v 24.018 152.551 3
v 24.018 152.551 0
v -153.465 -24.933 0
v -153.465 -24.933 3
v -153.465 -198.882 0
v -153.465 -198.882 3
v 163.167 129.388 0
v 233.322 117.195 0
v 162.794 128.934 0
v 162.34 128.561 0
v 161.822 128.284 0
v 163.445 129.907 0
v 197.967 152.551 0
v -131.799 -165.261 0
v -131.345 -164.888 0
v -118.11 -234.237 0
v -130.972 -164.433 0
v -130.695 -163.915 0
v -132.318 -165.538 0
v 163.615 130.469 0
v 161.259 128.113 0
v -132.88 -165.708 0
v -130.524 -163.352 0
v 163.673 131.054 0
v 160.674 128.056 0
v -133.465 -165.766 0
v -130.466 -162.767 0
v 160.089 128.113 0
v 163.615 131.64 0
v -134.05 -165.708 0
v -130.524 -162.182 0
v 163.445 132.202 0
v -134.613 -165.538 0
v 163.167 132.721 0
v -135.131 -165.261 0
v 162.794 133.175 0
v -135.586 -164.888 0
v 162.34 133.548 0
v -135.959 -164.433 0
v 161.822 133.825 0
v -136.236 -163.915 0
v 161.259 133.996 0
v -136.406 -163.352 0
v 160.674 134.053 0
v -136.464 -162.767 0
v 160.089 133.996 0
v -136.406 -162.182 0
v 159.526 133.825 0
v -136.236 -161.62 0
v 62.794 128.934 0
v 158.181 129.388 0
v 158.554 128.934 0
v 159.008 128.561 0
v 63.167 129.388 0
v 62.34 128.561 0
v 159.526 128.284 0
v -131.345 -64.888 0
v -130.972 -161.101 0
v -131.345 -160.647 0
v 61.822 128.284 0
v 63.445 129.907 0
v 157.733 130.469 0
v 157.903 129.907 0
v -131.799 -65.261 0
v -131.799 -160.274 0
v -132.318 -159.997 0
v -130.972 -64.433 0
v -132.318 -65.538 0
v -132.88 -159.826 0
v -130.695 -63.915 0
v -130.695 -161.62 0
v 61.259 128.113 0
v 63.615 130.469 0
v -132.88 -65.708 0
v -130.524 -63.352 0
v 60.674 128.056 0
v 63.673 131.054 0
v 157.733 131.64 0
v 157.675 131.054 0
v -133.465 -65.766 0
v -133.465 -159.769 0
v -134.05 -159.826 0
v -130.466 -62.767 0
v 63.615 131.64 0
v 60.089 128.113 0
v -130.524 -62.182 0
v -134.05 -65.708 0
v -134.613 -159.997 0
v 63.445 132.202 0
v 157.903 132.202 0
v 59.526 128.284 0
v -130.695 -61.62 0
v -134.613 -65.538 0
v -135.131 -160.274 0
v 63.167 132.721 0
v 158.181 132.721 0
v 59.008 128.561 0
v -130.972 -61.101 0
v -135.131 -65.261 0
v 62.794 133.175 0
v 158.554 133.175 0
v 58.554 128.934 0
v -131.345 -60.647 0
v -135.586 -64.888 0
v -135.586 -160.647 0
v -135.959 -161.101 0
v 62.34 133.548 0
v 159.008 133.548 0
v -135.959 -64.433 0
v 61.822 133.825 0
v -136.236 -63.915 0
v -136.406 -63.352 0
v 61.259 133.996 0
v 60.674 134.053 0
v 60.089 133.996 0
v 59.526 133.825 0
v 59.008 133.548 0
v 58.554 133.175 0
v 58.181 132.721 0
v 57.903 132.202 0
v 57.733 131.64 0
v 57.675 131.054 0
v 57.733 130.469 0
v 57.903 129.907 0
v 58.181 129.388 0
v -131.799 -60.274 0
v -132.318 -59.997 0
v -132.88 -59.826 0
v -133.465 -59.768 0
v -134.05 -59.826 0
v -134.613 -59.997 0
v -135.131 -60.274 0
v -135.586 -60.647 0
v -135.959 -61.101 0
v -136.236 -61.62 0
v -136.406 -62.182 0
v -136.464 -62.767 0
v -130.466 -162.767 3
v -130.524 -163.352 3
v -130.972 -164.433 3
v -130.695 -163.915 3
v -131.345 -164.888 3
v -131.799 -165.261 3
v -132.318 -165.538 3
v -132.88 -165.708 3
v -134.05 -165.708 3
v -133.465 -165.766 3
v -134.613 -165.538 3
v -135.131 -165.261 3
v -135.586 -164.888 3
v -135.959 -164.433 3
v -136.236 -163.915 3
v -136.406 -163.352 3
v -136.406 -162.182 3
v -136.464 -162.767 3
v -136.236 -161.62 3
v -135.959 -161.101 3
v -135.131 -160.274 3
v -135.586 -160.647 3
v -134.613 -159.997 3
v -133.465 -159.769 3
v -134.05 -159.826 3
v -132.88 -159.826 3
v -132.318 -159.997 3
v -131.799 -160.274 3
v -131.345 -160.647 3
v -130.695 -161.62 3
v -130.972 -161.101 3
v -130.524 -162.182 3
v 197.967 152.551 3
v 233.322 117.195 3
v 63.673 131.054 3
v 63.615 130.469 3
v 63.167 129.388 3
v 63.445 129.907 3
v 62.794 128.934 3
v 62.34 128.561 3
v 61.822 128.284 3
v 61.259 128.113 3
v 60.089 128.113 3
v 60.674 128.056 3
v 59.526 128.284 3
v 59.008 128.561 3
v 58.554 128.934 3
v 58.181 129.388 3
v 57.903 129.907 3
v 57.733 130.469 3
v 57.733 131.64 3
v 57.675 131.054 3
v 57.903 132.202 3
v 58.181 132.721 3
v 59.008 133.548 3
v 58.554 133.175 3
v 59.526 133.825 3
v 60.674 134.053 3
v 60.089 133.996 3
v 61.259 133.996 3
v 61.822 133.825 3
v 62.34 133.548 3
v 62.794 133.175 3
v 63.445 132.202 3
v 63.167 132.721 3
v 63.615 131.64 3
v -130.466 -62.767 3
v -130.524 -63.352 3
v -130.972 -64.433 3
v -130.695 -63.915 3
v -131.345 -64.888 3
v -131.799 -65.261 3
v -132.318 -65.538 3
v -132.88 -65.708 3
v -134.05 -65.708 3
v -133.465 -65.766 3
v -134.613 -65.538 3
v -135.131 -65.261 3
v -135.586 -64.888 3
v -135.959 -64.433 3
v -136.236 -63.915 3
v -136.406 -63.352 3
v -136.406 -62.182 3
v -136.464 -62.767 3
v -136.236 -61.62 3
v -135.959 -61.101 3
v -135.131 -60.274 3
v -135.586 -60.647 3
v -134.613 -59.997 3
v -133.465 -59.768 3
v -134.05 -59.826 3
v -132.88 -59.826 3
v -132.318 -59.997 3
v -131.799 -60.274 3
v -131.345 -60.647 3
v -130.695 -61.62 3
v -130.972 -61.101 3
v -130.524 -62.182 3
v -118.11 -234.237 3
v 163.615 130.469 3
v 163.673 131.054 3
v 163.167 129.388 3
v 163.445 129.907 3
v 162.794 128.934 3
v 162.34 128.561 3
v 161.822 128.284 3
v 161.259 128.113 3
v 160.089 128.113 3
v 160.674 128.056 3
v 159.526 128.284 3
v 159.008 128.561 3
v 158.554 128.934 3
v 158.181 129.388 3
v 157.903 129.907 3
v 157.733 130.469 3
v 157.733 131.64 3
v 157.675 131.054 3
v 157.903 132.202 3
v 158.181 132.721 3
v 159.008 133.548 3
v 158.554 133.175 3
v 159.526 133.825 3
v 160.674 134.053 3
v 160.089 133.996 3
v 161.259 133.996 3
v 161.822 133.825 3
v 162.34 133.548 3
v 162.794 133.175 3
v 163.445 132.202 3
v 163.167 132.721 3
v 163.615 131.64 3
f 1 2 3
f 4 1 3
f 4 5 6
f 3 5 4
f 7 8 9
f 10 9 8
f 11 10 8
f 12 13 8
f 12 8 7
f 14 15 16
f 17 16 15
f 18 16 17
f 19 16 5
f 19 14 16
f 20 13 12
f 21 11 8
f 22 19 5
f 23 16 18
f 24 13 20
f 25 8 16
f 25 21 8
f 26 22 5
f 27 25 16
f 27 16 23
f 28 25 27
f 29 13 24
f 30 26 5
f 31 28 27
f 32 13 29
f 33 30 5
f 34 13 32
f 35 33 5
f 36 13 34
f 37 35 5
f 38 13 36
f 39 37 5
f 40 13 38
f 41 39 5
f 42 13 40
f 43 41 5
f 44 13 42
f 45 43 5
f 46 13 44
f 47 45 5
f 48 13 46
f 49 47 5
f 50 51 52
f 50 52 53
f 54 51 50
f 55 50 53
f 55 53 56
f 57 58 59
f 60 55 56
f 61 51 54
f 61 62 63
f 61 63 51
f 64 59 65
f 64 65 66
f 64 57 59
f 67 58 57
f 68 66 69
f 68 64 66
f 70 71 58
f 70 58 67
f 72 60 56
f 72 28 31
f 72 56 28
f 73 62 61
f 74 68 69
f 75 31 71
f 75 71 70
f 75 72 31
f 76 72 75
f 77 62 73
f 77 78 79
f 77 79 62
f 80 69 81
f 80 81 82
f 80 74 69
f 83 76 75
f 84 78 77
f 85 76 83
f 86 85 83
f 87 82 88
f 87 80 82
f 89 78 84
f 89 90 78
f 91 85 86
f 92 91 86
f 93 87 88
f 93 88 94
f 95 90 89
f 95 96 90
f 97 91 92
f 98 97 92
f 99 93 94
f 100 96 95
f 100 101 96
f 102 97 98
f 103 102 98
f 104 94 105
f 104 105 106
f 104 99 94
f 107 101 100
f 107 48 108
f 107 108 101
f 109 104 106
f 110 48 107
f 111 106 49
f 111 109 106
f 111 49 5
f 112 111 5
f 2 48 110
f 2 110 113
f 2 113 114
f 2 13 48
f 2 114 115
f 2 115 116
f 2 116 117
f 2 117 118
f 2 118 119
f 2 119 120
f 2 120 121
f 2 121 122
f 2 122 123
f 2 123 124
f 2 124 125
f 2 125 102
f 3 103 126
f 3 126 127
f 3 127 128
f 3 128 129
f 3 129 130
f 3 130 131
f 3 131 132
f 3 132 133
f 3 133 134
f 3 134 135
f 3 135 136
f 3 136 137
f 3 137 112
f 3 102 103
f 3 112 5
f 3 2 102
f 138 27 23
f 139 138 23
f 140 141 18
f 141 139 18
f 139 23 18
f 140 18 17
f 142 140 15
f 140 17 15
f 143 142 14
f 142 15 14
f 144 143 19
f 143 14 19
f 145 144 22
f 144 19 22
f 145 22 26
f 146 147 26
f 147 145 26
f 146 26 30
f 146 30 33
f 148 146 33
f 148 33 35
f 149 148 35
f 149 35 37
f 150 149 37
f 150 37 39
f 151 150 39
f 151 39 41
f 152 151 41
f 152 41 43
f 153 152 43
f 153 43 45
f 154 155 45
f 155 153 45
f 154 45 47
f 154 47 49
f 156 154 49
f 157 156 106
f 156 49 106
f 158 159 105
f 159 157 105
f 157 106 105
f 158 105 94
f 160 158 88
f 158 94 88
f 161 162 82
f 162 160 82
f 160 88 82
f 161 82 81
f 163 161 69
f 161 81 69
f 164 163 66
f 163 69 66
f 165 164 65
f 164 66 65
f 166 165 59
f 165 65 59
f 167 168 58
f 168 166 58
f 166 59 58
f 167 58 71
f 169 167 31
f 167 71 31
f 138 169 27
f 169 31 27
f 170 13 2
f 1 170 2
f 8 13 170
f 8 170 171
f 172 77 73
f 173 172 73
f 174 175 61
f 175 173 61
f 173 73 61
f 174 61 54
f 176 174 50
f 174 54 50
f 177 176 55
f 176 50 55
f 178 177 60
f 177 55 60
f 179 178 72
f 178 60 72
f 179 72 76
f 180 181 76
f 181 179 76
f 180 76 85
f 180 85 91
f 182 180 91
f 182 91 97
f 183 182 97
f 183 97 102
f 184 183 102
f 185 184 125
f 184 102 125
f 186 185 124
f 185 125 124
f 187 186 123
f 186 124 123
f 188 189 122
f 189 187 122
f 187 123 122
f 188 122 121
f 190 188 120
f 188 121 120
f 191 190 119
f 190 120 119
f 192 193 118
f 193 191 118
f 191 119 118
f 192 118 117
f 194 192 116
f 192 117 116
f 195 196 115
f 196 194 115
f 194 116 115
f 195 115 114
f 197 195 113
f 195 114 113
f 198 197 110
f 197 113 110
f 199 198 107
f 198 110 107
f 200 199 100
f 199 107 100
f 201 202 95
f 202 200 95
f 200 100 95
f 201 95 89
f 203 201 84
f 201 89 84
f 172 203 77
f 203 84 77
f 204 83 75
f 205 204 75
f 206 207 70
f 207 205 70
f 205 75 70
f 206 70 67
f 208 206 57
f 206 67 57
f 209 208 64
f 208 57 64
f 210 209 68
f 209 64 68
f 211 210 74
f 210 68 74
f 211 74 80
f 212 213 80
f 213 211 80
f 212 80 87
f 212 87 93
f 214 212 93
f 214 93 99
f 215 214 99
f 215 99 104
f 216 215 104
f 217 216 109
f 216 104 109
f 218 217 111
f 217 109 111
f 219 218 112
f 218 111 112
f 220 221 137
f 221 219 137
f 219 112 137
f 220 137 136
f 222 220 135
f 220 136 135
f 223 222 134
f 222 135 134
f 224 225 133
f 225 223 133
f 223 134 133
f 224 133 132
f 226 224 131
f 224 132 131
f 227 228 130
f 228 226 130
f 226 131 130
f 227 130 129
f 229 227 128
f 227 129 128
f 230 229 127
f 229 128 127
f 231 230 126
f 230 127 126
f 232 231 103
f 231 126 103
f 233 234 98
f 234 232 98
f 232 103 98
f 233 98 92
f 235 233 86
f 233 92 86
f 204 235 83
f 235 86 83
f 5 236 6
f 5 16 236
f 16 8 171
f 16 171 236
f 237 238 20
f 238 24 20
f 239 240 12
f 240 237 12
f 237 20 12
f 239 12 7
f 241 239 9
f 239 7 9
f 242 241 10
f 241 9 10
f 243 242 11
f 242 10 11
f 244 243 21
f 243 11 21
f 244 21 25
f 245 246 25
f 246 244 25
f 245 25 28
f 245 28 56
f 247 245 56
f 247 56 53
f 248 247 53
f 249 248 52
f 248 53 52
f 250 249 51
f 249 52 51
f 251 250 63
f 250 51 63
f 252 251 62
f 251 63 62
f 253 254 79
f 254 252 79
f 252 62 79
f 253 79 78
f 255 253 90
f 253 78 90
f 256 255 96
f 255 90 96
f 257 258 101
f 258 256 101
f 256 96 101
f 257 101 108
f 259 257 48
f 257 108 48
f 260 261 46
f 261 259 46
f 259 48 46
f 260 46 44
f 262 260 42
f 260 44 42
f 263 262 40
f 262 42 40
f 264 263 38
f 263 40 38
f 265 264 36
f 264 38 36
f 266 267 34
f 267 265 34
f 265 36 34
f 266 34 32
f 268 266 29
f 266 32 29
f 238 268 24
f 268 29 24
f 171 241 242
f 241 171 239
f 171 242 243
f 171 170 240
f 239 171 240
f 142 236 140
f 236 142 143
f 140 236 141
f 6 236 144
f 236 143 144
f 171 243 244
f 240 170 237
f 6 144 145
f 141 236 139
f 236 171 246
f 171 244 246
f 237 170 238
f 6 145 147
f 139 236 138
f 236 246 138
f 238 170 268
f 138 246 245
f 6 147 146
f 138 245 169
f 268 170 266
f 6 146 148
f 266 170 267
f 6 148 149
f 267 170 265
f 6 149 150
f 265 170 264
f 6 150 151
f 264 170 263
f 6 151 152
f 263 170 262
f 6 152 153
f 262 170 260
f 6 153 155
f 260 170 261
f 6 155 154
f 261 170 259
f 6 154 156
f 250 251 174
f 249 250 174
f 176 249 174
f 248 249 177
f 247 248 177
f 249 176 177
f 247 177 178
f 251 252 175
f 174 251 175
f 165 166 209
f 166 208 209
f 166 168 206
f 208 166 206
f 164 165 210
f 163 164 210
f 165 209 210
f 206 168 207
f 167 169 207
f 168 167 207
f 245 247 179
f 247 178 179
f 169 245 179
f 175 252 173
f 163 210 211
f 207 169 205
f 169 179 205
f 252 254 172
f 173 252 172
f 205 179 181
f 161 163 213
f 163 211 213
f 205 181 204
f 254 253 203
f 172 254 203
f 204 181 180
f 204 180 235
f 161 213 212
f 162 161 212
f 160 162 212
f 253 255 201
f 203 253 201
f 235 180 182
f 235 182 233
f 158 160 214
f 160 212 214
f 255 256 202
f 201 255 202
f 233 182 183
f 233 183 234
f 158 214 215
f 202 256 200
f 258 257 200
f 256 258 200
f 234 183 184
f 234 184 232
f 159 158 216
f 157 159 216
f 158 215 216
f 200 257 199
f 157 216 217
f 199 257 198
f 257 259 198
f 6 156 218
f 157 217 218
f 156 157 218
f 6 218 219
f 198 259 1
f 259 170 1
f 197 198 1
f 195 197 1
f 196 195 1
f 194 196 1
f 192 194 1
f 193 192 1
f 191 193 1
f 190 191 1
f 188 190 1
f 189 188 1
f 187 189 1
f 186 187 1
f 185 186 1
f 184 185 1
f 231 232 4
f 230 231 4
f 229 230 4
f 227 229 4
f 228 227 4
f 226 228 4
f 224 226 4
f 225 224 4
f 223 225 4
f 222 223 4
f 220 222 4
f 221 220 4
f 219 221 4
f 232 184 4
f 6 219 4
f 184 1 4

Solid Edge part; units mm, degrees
sketch "Sketch1" plane through (0, 0, 0) normal (0, 0, 1) x (1, 0, 0)
  circle A0 centre (-133.4653, -62.7673) radius 2.9988
  circle A1 centre (-133.4653, -162.7673) radius 2.9988
  circle A2 centre (60.674, 131.0545) radius 2.9988
  circle A3 centre (160.674, 131.0545) radius 2.9988
  line L0 (-118.1099, -234.2368) -> (-153.4653, -198.8815)
  line L1 (-153.4653, -198.8815) -> (-153.4653, -24.9332)
  line L2 (24.0185, 152.5506) -> (-153.4653, -24.9332)
  line L3 (197.9668, 152.5506) -> (24.0185, 152.5506)
  line L4 (197.9668, 152.5506) -> (233.3222, 117.1952)
  line L5 (233.3222, 117.1952) -> (-118.1099, -234.2368)
  dimension "D1" = 497
  dimension "D2" = 50
  dimension "D3" = 173
  dimension "D4" = 5.9975
  dimension "D5" = 100
  dimension "D6" = 20
  dimension "D7" = 100
  dimension "D8" = 274.33
  dimension "D9" = 41.57
  dimension "D10" = 11.17
extrude "Protrusion1" add sketch "Sketch1" along normal blind 3
properties material "Nylon, allgemein"
